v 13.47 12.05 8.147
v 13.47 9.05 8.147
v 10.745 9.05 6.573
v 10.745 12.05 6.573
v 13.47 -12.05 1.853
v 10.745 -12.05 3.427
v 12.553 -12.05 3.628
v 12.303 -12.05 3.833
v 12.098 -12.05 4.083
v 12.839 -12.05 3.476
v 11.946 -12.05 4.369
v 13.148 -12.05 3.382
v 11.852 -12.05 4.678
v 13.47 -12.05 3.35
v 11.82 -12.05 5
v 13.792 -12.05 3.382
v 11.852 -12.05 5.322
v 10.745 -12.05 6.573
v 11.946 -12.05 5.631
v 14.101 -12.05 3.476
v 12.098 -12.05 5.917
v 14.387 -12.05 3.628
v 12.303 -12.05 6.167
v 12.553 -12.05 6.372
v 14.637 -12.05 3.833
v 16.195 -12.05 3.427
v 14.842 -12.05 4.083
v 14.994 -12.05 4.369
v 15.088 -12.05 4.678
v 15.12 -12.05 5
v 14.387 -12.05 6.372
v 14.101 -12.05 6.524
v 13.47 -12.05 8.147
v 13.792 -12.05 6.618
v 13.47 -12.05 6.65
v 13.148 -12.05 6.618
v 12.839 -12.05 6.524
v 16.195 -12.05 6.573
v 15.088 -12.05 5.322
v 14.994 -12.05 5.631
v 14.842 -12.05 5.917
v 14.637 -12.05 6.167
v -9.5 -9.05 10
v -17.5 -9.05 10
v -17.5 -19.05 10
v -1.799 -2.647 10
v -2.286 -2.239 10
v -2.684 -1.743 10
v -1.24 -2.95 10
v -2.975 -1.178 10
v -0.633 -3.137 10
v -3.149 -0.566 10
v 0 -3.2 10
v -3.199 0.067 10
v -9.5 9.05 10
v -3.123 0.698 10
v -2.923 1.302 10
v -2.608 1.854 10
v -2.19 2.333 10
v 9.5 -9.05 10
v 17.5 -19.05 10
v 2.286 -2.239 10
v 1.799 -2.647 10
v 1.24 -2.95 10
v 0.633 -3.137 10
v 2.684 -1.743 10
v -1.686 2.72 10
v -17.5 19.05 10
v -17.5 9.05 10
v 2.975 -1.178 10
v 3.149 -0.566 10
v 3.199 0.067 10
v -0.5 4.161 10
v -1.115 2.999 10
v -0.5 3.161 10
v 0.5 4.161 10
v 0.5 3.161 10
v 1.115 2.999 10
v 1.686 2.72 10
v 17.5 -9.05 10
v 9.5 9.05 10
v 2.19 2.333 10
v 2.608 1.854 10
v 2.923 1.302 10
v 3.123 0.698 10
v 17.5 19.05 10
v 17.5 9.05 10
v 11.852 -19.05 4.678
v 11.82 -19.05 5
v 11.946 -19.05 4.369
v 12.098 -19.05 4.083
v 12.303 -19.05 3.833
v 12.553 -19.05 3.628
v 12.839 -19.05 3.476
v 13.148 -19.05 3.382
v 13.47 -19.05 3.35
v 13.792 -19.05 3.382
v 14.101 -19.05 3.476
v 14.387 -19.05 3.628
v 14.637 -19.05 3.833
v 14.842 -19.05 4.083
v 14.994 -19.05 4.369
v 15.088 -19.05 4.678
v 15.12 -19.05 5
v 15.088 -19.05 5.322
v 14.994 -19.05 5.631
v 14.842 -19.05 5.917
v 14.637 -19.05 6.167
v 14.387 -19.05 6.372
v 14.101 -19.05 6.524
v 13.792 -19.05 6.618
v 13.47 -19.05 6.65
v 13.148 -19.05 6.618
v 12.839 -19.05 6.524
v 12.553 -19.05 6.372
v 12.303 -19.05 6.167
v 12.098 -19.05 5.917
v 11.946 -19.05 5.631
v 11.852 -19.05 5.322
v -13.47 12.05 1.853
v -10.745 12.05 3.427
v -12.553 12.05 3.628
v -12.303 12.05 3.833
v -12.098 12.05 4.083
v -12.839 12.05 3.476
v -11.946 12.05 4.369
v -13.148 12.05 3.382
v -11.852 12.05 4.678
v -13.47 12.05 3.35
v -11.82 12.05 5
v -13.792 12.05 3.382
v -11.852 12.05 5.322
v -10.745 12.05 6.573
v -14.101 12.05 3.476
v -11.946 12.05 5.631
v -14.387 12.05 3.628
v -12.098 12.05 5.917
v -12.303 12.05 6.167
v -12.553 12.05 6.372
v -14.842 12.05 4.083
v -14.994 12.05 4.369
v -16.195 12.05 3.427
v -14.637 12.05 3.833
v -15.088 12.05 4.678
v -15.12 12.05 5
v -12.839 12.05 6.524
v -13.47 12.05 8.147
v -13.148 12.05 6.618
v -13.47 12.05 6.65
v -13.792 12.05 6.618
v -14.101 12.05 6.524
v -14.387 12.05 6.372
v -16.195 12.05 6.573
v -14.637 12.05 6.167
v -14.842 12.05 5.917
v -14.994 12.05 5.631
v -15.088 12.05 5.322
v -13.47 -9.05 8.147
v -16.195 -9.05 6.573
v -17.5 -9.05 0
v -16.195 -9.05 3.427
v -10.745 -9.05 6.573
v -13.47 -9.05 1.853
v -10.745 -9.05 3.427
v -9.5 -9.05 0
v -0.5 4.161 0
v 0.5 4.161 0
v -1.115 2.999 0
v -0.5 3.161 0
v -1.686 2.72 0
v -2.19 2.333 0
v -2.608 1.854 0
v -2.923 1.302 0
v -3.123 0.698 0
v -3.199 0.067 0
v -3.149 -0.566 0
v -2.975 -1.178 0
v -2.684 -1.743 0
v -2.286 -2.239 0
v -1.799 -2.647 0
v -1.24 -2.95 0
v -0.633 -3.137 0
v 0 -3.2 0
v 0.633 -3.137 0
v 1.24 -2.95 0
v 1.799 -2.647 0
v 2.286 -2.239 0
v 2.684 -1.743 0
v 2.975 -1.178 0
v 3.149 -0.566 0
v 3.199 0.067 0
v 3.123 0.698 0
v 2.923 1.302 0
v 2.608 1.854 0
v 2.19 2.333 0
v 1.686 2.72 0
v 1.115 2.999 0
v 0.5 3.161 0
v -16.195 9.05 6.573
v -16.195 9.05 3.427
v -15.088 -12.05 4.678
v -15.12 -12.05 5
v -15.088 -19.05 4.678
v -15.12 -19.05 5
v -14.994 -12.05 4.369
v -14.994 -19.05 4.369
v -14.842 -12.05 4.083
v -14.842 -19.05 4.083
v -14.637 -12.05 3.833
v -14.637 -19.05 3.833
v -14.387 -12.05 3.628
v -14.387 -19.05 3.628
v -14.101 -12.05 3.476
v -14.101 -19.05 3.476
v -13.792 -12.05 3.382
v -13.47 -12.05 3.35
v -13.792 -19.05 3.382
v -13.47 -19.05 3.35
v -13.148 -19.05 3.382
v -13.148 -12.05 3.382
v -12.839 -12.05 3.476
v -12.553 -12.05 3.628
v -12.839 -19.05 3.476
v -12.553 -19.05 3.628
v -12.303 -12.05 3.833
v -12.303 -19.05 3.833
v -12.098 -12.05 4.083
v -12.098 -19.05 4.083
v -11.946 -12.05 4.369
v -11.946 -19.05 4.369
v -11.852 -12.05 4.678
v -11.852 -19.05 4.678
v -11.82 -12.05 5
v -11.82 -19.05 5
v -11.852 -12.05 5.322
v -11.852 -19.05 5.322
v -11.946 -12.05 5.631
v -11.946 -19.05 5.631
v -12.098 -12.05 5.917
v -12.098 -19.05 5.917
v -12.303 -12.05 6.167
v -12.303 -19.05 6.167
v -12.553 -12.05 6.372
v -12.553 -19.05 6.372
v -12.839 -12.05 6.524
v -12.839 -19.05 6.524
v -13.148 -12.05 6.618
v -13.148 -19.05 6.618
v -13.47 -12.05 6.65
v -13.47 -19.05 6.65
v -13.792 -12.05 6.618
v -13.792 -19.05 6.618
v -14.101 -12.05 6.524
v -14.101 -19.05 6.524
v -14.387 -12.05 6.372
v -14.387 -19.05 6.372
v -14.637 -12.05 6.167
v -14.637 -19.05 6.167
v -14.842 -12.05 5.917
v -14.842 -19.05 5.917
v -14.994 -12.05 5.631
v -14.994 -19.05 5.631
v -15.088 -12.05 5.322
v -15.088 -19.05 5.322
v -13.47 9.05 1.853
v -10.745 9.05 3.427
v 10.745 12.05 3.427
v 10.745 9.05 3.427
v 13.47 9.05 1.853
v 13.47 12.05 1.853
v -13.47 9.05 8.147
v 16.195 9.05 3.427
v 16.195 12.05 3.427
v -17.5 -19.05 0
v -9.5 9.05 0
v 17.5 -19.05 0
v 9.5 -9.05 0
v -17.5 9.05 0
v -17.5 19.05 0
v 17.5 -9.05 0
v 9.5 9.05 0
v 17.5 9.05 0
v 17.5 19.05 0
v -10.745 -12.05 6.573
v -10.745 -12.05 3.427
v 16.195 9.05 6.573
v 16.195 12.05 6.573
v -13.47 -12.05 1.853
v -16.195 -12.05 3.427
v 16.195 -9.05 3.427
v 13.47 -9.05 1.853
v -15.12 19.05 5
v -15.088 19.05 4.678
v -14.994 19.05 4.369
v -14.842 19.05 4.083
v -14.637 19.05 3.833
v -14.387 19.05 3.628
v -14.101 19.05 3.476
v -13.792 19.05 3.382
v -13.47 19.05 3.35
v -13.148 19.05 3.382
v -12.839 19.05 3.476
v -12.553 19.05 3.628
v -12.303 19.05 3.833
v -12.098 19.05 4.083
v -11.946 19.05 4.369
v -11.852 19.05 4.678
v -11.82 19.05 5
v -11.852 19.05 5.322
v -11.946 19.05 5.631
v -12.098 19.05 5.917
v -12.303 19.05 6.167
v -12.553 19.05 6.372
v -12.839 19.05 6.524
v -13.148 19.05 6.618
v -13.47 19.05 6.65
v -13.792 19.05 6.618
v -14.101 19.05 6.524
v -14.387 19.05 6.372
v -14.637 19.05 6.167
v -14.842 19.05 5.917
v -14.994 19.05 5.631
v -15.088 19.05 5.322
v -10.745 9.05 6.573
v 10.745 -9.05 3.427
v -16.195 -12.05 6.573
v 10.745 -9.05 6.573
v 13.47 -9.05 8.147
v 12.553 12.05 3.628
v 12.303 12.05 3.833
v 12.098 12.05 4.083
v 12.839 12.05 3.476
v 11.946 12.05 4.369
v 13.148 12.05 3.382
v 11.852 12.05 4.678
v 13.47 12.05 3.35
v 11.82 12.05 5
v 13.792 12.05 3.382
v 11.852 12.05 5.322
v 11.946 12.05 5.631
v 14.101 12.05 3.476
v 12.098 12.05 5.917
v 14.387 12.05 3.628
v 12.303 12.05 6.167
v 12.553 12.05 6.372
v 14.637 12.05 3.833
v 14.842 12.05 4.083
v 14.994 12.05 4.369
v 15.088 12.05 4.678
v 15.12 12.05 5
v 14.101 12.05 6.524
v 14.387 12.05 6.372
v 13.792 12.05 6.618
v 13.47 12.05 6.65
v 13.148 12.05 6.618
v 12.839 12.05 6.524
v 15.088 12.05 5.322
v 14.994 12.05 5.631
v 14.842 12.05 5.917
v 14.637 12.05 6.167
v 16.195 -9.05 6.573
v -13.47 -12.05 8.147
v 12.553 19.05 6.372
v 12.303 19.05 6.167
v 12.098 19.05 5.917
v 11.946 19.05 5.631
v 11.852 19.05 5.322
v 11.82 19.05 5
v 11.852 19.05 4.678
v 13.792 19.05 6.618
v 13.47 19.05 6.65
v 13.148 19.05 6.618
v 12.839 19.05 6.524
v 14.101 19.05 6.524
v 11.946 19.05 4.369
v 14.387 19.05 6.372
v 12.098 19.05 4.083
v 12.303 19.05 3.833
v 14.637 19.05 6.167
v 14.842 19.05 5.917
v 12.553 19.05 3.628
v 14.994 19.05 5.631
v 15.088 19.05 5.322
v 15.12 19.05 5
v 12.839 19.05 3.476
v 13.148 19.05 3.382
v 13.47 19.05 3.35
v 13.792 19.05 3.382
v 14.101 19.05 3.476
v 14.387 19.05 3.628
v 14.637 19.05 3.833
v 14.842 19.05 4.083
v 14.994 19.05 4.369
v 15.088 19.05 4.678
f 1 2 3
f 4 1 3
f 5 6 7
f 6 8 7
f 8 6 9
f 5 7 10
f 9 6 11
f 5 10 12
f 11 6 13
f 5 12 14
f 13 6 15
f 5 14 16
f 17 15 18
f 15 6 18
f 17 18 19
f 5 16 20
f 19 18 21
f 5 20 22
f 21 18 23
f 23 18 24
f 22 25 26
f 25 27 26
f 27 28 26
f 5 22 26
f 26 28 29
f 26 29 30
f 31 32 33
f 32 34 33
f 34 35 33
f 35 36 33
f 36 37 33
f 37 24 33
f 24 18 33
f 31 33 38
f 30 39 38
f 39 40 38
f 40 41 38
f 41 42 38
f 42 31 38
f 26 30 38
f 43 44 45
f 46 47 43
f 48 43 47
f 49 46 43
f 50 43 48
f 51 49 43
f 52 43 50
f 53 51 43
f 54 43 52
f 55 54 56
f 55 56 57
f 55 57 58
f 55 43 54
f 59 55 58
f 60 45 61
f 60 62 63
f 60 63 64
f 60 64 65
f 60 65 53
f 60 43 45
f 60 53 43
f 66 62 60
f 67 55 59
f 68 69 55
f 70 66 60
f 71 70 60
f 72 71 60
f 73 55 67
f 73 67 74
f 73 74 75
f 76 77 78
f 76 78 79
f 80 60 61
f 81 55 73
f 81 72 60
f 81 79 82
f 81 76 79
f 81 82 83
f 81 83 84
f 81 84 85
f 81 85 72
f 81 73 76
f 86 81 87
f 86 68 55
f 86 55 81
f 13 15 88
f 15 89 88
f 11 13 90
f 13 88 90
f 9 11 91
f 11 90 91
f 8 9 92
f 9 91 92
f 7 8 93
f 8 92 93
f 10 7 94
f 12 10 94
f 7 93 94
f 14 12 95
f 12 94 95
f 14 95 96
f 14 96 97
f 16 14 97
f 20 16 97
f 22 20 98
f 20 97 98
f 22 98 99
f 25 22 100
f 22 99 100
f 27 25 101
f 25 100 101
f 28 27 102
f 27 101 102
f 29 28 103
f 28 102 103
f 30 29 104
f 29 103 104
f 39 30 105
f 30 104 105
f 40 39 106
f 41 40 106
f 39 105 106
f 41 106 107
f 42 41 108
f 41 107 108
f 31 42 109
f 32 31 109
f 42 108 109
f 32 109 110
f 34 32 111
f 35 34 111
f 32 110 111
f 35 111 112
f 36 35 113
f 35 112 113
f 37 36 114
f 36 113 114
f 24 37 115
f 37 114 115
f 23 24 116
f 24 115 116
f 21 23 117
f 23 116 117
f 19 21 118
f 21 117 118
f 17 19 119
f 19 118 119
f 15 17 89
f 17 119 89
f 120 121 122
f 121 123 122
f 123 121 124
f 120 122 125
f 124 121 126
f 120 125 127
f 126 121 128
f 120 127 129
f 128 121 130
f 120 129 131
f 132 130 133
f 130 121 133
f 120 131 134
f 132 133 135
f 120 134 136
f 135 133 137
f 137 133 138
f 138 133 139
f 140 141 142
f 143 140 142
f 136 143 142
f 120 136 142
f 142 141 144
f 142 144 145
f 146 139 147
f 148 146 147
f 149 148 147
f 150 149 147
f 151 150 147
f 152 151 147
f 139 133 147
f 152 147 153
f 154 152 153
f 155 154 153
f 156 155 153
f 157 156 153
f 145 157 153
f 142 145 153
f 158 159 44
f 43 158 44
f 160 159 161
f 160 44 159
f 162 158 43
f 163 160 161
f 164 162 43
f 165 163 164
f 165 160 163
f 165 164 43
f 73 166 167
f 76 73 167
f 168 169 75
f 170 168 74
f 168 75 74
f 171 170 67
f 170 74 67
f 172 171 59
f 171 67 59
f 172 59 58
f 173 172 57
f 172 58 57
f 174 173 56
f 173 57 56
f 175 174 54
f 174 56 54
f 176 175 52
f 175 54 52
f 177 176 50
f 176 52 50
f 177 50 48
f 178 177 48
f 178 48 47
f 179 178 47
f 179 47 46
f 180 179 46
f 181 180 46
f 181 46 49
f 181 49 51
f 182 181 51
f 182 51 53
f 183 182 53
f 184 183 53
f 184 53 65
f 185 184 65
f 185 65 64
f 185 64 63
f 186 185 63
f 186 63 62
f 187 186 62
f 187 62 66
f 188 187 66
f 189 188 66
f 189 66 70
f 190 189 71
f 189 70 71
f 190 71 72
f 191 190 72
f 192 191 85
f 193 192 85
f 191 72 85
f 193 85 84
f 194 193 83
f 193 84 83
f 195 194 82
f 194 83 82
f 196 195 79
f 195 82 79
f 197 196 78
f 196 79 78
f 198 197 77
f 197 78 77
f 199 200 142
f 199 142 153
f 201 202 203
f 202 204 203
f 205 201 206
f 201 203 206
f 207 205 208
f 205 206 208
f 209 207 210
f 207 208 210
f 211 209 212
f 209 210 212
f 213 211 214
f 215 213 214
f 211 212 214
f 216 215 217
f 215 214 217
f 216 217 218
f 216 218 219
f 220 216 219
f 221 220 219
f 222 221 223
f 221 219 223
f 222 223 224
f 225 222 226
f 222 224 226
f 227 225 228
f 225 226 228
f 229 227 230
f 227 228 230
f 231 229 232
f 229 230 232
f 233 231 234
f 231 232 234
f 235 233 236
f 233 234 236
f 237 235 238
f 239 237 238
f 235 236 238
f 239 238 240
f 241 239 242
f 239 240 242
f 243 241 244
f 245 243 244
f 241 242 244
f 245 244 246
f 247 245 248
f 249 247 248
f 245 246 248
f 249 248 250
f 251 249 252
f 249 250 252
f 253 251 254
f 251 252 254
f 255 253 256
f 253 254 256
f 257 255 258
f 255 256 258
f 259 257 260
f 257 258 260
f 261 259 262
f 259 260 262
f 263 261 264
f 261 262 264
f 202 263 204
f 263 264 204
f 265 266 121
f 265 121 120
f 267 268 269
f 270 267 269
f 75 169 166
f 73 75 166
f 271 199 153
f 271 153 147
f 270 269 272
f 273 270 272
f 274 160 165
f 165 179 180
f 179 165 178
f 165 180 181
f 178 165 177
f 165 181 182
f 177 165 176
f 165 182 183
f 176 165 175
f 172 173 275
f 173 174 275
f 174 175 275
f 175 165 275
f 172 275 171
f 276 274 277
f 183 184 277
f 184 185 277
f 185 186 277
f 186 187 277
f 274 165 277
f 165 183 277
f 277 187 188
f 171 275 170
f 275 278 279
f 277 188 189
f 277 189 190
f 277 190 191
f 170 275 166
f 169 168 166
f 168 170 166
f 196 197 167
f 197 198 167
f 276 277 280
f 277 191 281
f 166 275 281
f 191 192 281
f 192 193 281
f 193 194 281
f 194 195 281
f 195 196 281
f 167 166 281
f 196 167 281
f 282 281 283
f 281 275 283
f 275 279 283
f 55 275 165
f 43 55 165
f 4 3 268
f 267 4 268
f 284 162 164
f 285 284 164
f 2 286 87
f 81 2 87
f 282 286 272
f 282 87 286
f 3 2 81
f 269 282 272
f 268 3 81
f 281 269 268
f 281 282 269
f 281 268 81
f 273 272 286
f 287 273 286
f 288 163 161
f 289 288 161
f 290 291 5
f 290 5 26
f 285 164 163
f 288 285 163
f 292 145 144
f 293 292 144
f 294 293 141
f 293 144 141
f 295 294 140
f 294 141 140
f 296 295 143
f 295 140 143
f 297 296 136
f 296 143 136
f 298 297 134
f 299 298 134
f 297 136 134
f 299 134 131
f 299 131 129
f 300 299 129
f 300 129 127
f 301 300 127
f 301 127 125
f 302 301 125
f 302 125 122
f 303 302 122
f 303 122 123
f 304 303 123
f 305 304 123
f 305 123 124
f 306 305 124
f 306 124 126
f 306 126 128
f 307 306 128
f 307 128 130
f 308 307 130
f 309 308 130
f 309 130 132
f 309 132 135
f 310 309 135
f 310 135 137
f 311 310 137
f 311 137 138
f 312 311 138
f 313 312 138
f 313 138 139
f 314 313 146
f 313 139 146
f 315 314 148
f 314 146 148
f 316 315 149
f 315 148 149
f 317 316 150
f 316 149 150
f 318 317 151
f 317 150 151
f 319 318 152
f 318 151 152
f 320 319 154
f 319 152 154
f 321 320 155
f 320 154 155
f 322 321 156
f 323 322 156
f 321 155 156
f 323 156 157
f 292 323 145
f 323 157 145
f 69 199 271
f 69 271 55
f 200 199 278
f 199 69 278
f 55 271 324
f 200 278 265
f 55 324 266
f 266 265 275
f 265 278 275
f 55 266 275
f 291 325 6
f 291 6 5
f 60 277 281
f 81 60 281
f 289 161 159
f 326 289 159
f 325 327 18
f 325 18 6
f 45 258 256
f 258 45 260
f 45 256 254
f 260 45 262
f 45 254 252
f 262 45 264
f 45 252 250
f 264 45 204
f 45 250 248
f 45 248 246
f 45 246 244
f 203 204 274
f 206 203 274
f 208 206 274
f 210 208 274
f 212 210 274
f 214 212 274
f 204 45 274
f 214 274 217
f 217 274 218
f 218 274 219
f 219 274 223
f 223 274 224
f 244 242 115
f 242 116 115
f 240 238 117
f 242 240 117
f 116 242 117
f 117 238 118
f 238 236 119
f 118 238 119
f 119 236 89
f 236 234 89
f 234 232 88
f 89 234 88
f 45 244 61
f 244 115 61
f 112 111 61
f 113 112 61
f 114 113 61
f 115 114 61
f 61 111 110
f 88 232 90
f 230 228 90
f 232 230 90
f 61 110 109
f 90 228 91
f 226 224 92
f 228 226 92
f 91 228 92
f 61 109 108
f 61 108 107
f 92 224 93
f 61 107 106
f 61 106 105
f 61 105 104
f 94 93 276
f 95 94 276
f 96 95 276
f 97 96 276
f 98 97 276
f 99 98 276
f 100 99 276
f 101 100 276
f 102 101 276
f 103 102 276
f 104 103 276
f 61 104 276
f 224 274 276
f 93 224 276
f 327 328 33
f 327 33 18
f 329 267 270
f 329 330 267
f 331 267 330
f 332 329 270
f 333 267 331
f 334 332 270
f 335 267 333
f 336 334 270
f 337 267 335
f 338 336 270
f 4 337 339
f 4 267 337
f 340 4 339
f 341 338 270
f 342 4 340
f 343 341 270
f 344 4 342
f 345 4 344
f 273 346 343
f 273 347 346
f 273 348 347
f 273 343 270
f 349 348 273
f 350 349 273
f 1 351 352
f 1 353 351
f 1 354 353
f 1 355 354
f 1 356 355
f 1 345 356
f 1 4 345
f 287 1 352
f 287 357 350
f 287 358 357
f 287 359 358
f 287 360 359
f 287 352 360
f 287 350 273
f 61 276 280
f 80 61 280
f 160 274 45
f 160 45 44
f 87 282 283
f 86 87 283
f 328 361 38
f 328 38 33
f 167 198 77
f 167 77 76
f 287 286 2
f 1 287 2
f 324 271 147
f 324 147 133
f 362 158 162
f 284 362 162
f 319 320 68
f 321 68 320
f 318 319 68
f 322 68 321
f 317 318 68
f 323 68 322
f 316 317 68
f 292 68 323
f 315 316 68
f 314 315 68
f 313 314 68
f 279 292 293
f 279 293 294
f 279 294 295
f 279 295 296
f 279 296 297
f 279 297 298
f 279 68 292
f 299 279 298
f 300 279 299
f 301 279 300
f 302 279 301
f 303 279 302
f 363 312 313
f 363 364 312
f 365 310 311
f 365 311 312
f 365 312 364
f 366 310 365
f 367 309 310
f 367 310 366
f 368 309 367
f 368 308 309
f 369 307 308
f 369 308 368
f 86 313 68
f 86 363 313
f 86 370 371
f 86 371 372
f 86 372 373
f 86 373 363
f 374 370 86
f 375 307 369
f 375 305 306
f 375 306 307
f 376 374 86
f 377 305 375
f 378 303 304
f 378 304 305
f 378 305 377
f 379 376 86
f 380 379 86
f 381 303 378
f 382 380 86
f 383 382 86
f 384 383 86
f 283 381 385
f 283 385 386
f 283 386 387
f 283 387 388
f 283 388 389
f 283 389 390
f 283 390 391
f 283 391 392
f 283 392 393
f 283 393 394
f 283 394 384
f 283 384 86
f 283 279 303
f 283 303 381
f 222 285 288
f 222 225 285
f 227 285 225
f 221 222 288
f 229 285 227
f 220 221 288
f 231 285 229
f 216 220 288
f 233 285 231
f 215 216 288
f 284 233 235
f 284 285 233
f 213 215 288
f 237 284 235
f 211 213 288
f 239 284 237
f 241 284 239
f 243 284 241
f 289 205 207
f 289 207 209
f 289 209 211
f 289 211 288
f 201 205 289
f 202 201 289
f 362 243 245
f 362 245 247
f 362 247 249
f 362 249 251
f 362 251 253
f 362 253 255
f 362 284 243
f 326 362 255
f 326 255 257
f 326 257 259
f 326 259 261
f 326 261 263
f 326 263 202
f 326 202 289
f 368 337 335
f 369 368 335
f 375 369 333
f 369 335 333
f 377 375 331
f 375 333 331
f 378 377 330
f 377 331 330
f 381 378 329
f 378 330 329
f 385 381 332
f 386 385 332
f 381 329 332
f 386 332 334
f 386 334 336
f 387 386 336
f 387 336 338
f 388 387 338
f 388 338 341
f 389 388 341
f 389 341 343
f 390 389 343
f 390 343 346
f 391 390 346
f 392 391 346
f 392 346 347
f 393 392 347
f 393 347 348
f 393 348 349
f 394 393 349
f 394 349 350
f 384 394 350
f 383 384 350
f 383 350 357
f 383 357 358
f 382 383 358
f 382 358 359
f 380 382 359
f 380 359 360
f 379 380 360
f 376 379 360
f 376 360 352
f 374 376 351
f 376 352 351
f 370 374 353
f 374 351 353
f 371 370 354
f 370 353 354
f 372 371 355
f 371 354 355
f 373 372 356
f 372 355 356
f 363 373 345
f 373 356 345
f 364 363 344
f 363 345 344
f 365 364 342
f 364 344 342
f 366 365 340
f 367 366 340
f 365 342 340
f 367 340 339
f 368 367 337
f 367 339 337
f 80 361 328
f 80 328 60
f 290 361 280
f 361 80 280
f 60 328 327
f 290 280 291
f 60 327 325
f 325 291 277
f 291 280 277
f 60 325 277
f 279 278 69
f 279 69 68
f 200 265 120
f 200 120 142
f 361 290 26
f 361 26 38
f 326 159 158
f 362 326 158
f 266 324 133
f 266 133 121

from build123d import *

# Parameters (mm, degrees)
SKETCH1_W                                  = 35
SKETCH1_H                                  = 38.1
BOSS_EXTRUDE1_DEPTH                        = 10
F_3_3_3_3_DIAMETER_HOLE1_D                 = 3.3
SKETCH4_R                                  = 3.2
CUT_EXTRUDE1_DEPTH                         = 28.733598757
SKETCH5_W                                  = 8
SKETCH5_H                                  = 9.05
CUT_EXTRUDE2_DEPTH                         = 10
CUT_EXTRUDE3_DEPTH                         = 3
MIRROR2_AT_THE_SECOND_PLANE_COPY_1_SKETC_W = 8
MIRROR2_AT_THE_SECOND_PLANE_COPY_1_SKETC_H = 9.05
MIRROR2_AT_THE_SECOND_PLANE_COPY_1_DEPTH   = 10
MIRROR2_AT_THE_SECOND_PLANE_COPY_2_DEPTH   = 3
CUT_EXTRUDE4_DEPTH                         = 28.733598757
CUT_EXTRUDE4_DEPTH_BACK                    = 28.733598757
SKETCH7_W                                  = 1
SKETCH7_H                                  = 1


with BuildPart() as part:
    # Sketch1 → Boss-Extrude1 (new body)
    with BuildSketch(Plane.XY):
        Rectangle(SKETCH1_W, SKETCH1_H)
    extrude(amount=BOSS_EXTRUDE1_DEPTH)

    # Ø3.3 (3.3) Diameter Hole1 (through all)
    with Locations(Plane(origin=(0, 19.05, 0), x_dir=(1, 0, 0), z_dir=(0, 1, 0))):
        with Locations((-13.47, -5), (13.47, -5)):
            Hole(F_3_3_3_3_DIAMETER_HOLE1_D / 2)

    # Sketch4 → Cut-Extrude1 (cut, through all)
    with BuildSketch(Plane.XY.offset(10)):
        Circle(SKETCH4_R)
    extrude(amount=-CUT_EXTRUDE1_DEPTH, mode=Mode.SUBTRACT)

    # Sketch5 → Cut-Extrude2 (cut)
    with BuildSketch(Plane(origin=(0, 0, 0), x_dir=(-1, 0, 0), z_dir=(0, 0, -1))):
        with Locations((-13.5, 4.525)):
            Rectangle(SKETCH5_W, SKETCH5_H)
    cut_extrude2 = extrude(amount=-CUT_EXTRUDE2_DEPTH, mode=Mode.SUBTRACT)

    # Sketch6 → Cut-Extrude3 (cut)
    with BuildSketch(Plane.XZ.offset(-9.05)):
        Polygon((16.195, 6.573279484), (13.47, 8.146558967), (10.745, 6.573279484), (10.745, 3.426720516), (13.47, 1.853441033), (16.195, 3.426720516), align=None)
    cut_extrude3 = extrude(amount=-CUT_EXTRUDE3_DEPTH, mode=Mode.SUBTRACT)

    # Mirror2: Cut-Extrude2, Cut-Extrude3 across plane
    add(cut_extrude2.mirror(Plane(origin=(0, 0, 0), x_dir=(0, 0, 1), z_dir=(1, 0, 0))), mode=Mode.SUBTRACT)
    add(cut_extrude3.mirror(Plane(origin=(0, 0, 0), x_dir=(0, 0, 1), z_dir=(1, 0, 0))), mode=Mode.SUBTRACT)

    # Mirror2 at the second plane: Cut-Extrude2, Cut-Extrude3 across plane
    add(cut_extrude2.mirror(Plane.ZX), mode=Mode.SUBTRACT)
    add(cut_extrude3.mirror(Plane.ZX), mode=Mode.SUBTRACT)

    # Mirror2 at the second plane copy 1 sketc → Mirror2 at the second plane copy 1 (cut)
    with BuildSketch(Plane(origin=(0, 0, 0), x_dir=(1, 0, 0), z_dir=(0, 0, -1))):
        with Locations((-13.5, 4.525)):
            Rectangle(MIRROR2_AT_THE_SECOND_PLANE_COPY_1_SKETC_W, MIRROR2_AT_THE_SECOND_PLANE_COPY_1_SKETC_H)
    extrude(amount=-MIRROR2_AT_THE_SECOND_PLANE_COPY_1_DEPTH, mode=Mode.SUBTRACT)

    # Mirror2 at the second plane copy 2 sketc → Mirror2 at the second plane copy 2 (cut)
    with BuildSketch(Plane(origin=(0, -9.05, 0), x_dir=(-1, 0, 0), z_dir=(0, 1, 0))):
        Polygon((16.195, 6.573279484), (13.47, 8.146558967), (10.745, 6.573279484), (10.745, 3.426720516), (13.47, 1.853441033), (16.195, 3.426720516), align=None)
    extrude(amount=-MIRROR2_AT_THE_SECOND_PLANE_COPY_2_DEPTH, mode=Mode.SUBTRACT)

    # Sketch7 → Cut-Extrude4 (cut, two sides: drawn at the far end of the back side and taken through both)
    with BuildSketch(Plane.XY.offset(10).offset(-CUT_EXTRUDE4_DEPTH_BACK)):
        with Locations((0, 3.660696126)):
            Rectangle(SKETCH7_W, SKETCH7_H)
    extrude(amount=CUT_EXTRUDE4_DEPTH + CUT_EXTRUDE4_DEPTH_BACK, mode=Mode.SUBTRACT)


solid = part.part
